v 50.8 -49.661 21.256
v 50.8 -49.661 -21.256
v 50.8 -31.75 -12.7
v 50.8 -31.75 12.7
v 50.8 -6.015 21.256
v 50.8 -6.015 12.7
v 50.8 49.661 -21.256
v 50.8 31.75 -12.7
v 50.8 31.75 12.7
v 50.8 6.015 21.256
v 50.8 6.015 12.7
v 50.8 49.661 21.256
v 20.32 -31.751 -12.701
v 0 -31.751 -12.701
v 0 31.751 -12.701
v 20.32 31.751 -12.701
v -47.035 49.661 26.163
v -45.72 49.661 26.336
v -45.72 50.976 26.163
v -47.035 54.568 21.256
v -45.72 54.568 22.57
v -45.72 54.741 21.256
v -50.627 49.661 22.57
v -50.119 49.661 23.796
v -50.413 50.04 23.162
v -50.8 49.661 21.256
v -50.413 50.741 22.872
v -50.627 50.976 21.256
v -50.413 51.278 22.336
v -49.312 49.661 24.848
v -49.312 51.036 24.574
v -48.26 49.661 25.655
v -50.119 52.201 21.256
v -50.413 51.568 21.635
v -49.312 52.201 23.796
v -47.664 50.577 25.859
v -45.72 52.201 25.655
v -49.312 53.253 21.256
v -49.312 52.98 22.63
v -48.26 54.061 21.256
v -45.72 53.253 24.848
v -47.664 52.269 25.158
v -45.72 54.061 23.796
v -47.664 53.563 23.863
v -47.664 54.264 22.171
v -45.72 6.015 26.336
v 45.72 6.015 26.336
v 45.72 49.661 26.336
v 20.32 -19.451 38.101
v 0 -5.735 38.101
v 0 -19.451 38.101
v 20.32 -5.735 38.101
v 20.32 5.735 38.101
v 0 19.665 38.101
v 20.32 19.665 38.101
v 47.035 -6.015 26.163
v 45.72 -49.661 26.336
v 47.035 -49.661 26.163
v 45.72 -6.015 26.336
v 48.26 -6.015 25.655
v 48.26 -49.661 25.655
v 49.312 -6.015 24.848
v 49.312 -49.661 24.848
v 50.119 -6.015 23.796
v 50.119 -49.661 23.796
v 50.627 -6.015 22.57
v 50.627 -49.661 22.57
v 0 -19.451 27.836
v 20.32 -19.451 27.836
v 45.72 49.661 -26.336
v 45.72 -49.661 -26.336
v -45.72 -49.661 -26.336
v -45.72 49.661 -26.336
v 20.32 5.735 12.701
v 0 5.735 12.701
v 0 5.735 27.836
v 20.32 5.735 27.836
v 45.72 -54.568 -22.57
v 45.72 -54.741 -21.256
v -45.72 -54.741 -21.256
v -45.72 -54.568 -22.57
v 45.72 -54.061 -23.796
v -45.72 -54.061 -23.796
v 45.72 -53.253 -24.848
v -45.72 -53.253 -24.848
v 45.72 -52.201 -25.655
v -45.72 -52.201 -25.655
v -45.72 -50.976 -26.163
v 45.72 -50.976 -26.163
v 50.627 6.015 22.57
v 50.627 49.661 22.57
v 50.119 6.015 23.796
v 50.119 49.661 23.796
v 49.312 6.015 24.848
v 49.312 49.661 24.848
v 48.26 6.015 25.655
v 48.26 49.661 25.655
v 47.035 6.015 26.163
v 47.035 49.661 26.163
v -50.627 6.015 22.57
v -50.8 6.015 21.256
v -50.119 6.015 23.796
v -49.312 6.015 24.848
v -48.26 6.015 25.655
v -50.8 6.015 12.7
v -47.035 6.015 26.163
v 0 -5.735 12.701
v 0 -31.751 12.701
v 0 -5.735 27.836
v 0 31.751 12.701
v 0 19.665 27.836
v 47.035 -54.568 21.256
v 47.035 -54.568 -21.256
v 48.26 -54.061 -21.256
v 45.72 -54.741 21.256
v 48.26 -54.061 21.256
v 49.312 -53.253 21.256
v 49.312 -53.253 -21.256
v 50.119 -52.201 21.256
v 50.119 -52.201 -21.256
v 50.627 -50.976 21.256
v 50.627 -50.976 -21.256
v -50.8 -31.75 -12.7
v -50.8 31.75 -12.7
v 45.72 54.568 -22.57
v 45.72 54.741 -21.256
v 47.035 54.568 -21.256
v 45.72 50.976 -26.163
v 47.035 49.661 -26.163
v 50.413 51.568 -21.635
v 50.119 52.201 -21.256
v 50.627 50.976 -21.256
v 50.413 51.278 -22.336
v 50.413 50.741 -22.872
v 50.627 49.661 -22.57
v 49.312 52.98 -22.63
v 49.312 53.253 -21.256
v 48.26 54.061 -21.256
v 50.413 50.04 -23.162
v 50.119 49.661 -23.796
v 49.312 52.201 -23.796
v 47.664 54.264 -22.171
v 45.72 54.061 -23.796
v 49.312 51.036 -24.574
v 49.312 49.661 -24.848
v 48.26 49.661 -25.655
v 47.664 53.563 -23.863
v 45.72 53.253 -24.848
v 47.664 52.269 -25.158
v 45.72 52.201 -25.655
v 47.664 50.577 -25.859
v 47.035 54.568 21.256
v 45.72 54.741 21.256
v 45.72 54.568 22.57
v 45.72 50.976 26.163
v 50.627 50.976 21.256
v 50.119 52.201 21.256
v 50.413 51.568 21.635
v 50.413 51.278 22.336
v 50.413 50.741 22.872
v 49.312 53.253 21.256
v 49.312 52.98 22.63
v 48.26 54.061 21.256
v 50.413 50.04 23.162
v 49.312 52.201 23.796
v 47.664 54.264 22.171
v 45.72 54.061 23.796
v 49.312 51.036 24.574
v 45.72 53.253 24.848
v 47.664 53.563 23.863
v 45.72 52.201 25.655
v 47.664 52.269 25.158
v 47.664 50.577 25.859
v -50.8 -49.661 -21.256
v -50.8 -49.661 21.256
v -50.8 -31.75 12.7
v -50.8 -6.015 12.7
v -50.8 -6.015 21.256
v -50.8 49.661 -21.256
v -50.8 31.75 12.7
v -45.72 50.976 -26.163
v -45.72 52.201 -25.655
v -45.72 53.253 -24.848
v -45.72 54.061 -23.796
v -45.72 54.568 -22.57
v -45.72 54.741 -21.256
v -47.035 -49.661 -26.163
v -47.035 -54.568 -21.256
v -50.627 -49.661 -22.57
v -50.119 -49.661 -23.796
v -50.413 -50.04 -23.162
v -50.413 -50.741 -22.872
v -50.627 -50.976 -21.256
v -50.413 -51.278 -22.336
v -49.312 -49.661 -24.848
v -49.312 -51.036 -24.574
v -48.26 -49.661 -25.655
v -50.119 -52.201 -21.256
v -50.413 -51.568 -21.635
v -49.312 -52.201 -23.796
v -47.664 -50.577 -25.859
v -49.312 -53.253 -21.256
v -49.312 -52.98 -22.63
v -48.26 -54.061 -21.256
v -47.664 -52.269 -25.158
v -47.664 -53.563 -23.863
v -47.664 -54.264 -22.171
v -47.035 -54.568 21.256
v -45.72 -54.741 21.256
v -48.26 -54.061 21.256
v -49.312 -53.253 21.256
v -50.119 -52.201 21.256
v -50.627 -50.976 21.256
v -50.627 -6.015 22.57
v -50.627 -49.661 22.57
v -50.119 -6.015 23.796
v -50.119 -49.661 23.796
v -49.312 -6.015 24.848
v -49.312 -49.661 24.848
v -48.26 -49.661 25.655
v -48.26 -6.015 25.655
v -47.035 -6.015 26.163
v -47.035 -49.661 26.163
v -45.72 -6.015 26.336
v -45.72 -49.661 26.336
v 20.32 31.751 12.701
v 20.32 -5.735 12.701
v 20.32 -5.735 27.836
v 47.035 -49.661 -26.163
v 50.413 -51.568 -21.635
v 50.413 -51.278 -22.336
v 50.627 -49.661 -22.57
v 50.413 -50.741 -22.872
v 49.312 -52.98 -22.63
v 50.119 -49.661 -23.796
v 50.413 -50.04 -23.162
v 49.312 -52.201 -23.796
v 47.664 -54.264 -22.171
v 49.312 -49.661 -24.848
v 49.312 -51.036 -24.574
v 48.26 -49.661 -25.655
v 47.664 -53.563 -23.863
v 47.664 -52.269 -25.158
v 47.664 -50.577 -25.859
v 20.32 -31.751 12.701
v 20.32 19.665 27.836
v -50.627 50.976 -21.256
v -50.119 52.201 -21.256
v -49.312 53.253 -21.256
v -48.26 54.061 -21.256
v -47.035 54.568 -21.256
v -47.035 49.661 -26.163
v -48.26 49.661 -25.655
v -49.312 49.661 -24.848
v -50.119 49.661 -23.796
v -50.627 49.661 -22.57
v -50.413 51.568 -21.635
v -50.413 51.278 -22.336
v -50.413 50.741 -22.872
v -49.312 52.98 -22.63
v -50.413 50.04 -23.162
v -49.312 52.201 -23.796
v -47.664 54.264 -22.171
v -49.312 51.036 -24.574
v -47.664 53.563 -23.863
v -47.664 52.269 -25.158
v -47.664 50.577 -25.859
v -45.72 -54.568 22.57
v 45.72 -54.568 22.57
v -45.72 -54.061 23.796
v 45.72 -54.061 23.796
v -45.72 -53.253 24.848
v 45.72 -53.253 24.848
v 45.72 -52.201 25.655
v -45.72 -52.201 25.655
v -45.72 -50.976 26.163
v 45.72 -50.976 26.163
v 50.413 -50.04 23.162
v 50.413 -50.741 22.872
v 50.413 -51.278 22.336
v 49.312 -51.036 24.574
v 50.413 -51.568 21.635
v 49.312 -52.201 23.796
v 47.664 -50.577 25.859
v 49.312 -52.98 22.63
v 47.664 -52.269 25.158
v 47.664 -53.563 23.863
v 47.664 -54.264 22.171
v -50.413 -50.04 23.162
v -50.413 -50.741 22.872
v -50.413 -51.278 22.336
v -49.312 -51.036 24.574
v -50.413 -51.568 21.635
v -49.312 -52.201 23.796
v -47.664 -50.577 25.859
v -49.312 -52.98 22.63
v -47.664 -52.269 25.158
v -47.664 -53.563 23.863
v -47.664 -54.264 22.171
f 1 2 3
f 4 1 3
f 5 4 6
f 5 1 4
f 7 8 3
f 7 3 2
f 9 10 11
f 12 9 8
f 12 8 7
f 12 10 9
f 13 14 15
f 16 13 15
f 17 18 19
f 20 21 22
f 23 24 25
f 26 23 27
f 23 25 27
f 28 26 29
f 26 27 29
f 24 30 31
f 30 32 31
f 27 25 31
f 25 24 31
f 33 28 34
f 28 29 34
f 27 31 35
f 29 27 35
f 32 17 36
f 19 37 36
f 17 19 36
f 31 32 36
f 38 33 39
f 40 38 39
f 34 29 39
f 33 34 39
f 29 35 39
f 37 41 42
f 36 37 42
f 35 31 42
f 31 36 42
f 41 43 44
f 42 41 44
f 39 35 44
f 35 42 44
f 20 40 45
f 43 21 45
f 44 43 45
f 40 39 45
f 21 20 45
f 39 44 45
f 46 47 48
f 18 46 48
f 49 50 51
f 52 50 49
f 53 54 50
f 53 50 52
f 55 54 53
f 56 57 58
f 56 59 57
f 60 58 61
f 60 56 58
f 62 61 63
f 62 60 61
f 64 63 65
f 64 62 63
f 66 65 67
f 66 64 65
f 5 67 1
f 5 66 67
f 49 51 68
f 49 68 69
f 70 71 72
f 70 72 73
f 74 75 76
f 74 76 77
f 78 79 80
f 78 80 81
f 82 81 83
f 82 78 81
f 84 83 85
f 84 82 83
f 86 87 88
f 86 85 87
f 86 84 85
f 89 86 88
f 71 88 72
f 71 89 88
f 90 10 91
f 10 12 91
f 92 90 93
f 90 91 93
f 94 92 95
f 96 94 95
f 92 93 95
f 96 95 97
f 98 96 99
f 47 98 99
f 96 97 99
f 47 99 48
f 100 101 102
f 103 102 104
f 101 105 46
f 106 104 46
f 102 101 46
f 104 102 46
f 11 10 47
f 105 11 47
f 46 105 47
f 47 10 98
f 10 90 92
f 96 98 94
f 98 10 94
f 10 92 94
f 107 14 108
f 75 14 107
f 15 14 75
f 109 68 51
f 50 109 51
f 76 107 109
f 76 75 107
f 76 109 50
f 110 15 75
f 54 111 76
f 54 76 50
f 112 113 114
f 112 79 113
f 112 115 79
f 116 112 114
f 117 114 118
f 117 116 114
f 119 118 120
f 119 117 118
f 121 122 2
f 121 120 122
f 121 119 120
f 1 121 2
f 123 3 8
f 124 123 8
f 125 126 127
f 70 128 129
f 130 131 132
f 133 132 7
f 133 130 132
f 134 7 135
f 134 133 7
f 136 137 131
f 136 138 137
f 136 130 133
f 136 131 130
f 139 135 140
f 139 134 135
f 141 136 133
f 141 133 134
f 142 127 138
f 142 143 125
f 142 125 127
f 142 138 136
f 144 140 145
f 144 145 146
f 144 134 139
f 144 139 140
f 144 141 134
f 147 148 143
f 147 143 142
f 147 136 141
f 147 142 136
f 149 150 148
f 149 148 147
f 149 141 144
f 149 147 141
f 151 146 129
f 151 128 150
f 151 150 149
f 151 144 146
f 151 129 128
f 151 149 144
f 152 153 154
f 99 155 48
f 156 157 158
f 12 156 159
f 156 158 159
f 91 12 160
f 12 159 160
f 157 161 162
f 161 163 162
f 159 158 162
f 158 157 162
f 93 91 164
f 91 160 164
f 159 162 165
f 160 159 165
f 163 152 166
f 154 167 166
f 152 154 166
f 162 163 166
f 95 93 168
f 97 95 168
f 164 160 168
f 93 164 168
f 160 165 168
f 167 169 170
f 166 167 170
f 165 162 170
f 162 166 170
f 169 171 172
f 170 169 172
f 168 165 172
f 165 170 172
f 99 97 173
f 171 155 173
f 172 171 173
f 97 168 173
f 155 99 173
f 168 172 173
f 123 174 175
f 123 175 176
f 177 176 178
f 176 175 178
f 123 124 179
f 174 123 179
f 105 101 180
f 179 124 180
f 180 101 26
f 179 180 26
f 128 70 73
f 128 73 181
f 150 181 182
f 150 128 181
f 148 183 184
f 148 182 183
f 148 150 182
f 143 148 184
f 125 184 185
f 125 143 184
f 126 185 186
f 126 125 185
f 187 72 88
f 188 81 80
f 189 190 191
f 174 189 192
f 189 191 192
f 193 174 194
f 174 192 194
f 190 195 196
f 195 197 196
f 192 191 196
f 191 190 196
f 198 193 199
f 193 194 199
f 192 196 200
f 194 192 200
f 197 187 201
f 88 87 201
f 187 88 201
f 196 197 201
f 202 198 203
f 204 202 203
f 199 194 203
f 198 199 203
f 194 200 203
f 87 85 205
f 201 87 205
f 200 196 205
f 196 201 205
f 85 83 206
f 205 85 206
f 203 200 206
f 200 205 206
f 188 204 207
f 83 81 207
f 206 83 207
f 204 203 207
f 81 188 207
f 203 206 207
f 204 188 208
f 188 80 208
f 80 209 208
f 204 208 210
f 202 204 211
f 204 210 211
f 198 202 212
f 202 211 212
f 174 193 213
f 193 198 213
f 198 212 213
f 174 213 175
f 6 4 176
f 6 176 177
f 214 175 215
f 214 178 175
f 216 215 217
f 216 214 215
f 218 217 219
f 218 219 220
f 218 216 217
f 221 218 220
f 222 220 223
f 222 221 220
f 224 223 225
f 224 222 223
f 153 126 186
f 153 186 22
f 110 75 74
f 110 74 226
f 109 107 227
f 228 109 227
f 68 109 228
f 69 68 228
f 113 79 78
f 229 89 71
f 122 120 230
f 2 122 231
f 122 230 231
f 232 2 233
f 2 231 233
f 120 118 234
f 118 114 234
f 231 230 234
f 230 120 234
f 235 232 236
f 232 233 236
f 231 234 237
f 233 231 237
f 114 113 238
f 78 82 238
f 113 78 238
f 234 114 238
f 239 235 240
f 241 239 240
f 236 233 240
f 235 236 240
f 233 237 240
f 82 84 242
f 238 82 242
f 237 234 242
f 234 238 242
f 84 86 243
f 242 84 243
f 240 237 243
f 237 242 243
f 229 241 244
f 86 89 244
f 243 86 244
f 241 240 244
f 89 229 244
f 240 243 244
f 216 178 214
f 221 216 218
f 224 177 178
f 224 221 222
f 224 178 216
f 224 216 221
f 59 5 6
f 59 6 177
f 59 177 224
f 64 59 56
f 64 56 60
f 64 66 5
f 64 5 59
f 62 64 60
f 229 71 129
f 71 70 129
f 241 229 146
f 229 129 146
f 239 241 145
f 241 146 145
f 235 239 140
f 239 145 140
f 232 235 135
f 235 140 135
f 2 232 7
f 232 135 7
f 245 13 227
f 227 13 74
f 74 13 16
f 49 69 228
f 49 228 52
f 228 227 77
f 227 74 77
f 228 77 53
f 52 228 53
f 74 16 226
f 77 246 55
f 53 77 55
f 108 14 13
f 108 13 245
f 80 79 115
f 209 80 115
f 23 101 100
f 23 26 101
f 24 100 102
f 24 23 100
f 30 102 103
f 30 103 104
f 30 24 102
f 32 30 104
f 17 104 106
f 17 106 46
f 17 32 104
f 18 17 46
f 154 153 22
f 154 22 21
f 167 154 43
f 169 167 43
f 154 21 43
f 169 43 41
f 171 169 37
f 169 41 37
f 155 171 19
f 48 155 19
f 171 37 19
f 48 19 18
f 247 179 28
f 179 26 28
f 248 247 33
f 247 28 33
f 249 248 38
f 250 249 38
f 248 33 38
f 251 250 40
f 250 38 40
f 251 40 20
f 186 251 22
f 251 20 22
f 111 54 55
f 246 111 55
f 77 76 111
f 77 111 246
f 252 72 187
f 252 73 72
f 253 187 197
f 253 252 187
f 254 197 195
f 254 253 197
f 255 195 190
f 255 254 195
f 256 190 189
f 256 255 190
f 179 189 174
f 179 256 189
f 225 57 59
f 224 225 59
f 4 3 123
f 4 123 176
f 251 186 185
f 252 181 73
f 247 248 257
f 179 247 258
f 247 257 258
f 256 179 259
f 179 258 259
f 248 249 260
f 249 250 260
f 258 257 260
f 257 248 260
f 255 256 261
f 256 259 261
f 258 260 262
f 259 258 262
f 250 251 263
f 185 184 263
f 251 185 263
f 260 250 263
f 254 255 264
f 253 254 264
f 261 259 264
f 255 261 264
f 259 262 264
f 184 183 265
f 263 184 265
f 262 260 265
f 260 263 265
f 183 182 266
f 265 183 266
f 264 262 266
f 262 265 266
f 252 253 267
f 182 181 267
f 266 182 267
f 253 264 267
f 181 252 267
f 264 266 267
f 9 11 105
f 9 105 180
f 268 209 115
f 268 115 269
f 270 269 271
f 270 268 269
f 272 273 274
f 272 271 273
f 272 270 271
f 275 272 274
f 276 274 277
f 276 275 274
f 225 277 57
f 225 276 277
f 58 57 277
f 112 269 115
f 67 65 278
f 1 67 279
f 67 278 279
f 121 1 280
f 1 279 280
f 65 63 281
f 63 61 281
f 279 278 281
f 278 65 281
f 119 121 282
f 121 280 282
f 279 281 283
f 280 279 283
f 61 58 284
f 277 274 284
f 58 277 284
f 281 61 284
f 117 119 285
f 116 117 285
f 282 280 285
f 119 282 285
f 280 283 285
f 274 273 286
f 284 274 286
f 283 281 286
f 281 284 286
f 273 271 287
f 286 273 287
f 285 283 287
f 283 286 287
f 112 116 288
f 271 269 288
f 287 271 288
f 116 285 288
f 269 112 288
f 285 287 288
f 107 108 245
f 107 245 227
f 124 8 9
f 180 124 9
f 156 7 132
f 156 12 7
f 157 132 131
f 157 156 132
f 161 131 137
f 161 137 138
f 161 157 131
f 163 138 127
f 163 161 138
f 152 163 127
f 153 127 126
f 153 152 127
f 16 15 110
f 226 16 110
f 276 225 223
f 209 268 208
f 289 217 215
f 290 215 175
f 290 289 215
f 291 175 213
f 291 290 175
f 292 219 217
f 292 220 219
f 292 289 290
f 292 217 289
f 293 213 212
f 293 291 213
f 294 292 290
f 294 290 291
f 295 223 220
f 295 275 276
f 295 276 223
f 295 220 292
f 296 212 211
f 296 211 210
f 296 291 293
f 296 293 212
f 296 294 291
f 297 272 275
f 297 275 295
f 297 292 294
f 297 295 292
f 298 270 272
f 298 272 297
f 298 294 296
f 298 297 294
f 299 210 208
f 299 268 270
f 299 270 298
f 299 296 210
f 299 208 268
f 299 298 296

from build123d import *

# Parameters (mm, degrees)
F0_W           = 109.4823107123
F0_H           = 52.671354264
F1_DEPTH       = 50.8
F1_DEPTH_BACK  = 50.8
F2_W           = 63.5
F2_H           = 25.4
F3_DEPTH       = 124.714
F4_W           = 12.0294783264
F4_H           = 23.4994404018
F5_DEPTH       = 118.872
F6_W           = 63.5011941195
F6_H           = 25.4023242742
F7_DEPTH       = 20.32
F8_W           = 20.32
F8_H           = 11.4699648693
F9_DEPTH       = 25.4
F10_R          = 5.08
F11_W          = 20.32
F11_H          = 10.2655154929
F12_DEPTH      = 13.716
F12_DEPTH_BACK = 25.4


with BuildPart() as f1:
    # F0 (on Right) → F1 (new body, two sides)
    with BuildSketch(Plane.YZ) as f1_sk:
        Rectangle(F0_W, F0_H)
    extrude(amount=F1_DEPTH)
    extrude(f1_sk.sketch, amount=-F1_DEPTH_BACK)

    # F2 (on face) → F3 (cut)
    with BuildSketch(Plane.YZ.offset(50.8)):
        Rectangle(F2_W, F2_H)
    extrude(amount=-F3_DEPTH, mode=Mode.SUBTRACT)

    # F4 (on face) → F5 (cut)
    with BuildSketch(Plane.YZ.offset(50.8)):
        with Locations((0, 18.3239690959)):
            Rectangle(F4_W, F4_H)
    extrude(amount=-F5_DEPTH, mode=Mode.SUBTRACT)

    # F10
    f10_edges = [f1.edges().sort_by_distance(p)[0] for p in [
        (0, -54.741155, 26.335677),
        (0, 54.741155, 26.335677),
        (0, -54.741155, -26.335677),
        (0, 54.741155, -26.335677),
        (50.8, 54.741155, 0),
        (50.8, 30.377947, 26.335677),
        (50.8, -30.377947, 26.335677),
        (50.8, -54.741155, 0),
        (50.8, 0, -26.335677),
        (-50.8, 30.377947, 26.335677),
        (-50.8, -30.377947, 26.335677),
        (-50.8, 54.741155, 0),
        (-50.8, 0, -26.335677),
        (-50.8, -54.741155, 0),
    ]]
    fillet(f10_edges, radius=F10_R)


with BuildPart() as f7:
    # F6 (on Right) → F7 (new body)
    with BuildSketch(Plane.YZ):
        Rectangle(F6_W, F6_H)
    extrude(amount=F7_DEPTH)

    # F8 (on face) → F9 (join)
    with BuildSketch(Plane.XY.offset(12.7011621371)):
        with Locations((10.16, 0)):
            Rectangle(F8_W, F8_H)
    extrude(amount=F9_DEPTH)

    # F11 (on face) → F12 (join, two sides)
    with BuildSketch(Plane.XZ.offset(5.7349824347)) as f12_sk:
        with Locations((10.16, 32.9684043907)):
            Rectangle(F11_W, F11_H)
    extrude(amount=F12_DEPTH)
    extrude(f12_sk.sketch, amount=-F12_DEPTH_BACK)


solid = Compound([f1.part, f7.part])
